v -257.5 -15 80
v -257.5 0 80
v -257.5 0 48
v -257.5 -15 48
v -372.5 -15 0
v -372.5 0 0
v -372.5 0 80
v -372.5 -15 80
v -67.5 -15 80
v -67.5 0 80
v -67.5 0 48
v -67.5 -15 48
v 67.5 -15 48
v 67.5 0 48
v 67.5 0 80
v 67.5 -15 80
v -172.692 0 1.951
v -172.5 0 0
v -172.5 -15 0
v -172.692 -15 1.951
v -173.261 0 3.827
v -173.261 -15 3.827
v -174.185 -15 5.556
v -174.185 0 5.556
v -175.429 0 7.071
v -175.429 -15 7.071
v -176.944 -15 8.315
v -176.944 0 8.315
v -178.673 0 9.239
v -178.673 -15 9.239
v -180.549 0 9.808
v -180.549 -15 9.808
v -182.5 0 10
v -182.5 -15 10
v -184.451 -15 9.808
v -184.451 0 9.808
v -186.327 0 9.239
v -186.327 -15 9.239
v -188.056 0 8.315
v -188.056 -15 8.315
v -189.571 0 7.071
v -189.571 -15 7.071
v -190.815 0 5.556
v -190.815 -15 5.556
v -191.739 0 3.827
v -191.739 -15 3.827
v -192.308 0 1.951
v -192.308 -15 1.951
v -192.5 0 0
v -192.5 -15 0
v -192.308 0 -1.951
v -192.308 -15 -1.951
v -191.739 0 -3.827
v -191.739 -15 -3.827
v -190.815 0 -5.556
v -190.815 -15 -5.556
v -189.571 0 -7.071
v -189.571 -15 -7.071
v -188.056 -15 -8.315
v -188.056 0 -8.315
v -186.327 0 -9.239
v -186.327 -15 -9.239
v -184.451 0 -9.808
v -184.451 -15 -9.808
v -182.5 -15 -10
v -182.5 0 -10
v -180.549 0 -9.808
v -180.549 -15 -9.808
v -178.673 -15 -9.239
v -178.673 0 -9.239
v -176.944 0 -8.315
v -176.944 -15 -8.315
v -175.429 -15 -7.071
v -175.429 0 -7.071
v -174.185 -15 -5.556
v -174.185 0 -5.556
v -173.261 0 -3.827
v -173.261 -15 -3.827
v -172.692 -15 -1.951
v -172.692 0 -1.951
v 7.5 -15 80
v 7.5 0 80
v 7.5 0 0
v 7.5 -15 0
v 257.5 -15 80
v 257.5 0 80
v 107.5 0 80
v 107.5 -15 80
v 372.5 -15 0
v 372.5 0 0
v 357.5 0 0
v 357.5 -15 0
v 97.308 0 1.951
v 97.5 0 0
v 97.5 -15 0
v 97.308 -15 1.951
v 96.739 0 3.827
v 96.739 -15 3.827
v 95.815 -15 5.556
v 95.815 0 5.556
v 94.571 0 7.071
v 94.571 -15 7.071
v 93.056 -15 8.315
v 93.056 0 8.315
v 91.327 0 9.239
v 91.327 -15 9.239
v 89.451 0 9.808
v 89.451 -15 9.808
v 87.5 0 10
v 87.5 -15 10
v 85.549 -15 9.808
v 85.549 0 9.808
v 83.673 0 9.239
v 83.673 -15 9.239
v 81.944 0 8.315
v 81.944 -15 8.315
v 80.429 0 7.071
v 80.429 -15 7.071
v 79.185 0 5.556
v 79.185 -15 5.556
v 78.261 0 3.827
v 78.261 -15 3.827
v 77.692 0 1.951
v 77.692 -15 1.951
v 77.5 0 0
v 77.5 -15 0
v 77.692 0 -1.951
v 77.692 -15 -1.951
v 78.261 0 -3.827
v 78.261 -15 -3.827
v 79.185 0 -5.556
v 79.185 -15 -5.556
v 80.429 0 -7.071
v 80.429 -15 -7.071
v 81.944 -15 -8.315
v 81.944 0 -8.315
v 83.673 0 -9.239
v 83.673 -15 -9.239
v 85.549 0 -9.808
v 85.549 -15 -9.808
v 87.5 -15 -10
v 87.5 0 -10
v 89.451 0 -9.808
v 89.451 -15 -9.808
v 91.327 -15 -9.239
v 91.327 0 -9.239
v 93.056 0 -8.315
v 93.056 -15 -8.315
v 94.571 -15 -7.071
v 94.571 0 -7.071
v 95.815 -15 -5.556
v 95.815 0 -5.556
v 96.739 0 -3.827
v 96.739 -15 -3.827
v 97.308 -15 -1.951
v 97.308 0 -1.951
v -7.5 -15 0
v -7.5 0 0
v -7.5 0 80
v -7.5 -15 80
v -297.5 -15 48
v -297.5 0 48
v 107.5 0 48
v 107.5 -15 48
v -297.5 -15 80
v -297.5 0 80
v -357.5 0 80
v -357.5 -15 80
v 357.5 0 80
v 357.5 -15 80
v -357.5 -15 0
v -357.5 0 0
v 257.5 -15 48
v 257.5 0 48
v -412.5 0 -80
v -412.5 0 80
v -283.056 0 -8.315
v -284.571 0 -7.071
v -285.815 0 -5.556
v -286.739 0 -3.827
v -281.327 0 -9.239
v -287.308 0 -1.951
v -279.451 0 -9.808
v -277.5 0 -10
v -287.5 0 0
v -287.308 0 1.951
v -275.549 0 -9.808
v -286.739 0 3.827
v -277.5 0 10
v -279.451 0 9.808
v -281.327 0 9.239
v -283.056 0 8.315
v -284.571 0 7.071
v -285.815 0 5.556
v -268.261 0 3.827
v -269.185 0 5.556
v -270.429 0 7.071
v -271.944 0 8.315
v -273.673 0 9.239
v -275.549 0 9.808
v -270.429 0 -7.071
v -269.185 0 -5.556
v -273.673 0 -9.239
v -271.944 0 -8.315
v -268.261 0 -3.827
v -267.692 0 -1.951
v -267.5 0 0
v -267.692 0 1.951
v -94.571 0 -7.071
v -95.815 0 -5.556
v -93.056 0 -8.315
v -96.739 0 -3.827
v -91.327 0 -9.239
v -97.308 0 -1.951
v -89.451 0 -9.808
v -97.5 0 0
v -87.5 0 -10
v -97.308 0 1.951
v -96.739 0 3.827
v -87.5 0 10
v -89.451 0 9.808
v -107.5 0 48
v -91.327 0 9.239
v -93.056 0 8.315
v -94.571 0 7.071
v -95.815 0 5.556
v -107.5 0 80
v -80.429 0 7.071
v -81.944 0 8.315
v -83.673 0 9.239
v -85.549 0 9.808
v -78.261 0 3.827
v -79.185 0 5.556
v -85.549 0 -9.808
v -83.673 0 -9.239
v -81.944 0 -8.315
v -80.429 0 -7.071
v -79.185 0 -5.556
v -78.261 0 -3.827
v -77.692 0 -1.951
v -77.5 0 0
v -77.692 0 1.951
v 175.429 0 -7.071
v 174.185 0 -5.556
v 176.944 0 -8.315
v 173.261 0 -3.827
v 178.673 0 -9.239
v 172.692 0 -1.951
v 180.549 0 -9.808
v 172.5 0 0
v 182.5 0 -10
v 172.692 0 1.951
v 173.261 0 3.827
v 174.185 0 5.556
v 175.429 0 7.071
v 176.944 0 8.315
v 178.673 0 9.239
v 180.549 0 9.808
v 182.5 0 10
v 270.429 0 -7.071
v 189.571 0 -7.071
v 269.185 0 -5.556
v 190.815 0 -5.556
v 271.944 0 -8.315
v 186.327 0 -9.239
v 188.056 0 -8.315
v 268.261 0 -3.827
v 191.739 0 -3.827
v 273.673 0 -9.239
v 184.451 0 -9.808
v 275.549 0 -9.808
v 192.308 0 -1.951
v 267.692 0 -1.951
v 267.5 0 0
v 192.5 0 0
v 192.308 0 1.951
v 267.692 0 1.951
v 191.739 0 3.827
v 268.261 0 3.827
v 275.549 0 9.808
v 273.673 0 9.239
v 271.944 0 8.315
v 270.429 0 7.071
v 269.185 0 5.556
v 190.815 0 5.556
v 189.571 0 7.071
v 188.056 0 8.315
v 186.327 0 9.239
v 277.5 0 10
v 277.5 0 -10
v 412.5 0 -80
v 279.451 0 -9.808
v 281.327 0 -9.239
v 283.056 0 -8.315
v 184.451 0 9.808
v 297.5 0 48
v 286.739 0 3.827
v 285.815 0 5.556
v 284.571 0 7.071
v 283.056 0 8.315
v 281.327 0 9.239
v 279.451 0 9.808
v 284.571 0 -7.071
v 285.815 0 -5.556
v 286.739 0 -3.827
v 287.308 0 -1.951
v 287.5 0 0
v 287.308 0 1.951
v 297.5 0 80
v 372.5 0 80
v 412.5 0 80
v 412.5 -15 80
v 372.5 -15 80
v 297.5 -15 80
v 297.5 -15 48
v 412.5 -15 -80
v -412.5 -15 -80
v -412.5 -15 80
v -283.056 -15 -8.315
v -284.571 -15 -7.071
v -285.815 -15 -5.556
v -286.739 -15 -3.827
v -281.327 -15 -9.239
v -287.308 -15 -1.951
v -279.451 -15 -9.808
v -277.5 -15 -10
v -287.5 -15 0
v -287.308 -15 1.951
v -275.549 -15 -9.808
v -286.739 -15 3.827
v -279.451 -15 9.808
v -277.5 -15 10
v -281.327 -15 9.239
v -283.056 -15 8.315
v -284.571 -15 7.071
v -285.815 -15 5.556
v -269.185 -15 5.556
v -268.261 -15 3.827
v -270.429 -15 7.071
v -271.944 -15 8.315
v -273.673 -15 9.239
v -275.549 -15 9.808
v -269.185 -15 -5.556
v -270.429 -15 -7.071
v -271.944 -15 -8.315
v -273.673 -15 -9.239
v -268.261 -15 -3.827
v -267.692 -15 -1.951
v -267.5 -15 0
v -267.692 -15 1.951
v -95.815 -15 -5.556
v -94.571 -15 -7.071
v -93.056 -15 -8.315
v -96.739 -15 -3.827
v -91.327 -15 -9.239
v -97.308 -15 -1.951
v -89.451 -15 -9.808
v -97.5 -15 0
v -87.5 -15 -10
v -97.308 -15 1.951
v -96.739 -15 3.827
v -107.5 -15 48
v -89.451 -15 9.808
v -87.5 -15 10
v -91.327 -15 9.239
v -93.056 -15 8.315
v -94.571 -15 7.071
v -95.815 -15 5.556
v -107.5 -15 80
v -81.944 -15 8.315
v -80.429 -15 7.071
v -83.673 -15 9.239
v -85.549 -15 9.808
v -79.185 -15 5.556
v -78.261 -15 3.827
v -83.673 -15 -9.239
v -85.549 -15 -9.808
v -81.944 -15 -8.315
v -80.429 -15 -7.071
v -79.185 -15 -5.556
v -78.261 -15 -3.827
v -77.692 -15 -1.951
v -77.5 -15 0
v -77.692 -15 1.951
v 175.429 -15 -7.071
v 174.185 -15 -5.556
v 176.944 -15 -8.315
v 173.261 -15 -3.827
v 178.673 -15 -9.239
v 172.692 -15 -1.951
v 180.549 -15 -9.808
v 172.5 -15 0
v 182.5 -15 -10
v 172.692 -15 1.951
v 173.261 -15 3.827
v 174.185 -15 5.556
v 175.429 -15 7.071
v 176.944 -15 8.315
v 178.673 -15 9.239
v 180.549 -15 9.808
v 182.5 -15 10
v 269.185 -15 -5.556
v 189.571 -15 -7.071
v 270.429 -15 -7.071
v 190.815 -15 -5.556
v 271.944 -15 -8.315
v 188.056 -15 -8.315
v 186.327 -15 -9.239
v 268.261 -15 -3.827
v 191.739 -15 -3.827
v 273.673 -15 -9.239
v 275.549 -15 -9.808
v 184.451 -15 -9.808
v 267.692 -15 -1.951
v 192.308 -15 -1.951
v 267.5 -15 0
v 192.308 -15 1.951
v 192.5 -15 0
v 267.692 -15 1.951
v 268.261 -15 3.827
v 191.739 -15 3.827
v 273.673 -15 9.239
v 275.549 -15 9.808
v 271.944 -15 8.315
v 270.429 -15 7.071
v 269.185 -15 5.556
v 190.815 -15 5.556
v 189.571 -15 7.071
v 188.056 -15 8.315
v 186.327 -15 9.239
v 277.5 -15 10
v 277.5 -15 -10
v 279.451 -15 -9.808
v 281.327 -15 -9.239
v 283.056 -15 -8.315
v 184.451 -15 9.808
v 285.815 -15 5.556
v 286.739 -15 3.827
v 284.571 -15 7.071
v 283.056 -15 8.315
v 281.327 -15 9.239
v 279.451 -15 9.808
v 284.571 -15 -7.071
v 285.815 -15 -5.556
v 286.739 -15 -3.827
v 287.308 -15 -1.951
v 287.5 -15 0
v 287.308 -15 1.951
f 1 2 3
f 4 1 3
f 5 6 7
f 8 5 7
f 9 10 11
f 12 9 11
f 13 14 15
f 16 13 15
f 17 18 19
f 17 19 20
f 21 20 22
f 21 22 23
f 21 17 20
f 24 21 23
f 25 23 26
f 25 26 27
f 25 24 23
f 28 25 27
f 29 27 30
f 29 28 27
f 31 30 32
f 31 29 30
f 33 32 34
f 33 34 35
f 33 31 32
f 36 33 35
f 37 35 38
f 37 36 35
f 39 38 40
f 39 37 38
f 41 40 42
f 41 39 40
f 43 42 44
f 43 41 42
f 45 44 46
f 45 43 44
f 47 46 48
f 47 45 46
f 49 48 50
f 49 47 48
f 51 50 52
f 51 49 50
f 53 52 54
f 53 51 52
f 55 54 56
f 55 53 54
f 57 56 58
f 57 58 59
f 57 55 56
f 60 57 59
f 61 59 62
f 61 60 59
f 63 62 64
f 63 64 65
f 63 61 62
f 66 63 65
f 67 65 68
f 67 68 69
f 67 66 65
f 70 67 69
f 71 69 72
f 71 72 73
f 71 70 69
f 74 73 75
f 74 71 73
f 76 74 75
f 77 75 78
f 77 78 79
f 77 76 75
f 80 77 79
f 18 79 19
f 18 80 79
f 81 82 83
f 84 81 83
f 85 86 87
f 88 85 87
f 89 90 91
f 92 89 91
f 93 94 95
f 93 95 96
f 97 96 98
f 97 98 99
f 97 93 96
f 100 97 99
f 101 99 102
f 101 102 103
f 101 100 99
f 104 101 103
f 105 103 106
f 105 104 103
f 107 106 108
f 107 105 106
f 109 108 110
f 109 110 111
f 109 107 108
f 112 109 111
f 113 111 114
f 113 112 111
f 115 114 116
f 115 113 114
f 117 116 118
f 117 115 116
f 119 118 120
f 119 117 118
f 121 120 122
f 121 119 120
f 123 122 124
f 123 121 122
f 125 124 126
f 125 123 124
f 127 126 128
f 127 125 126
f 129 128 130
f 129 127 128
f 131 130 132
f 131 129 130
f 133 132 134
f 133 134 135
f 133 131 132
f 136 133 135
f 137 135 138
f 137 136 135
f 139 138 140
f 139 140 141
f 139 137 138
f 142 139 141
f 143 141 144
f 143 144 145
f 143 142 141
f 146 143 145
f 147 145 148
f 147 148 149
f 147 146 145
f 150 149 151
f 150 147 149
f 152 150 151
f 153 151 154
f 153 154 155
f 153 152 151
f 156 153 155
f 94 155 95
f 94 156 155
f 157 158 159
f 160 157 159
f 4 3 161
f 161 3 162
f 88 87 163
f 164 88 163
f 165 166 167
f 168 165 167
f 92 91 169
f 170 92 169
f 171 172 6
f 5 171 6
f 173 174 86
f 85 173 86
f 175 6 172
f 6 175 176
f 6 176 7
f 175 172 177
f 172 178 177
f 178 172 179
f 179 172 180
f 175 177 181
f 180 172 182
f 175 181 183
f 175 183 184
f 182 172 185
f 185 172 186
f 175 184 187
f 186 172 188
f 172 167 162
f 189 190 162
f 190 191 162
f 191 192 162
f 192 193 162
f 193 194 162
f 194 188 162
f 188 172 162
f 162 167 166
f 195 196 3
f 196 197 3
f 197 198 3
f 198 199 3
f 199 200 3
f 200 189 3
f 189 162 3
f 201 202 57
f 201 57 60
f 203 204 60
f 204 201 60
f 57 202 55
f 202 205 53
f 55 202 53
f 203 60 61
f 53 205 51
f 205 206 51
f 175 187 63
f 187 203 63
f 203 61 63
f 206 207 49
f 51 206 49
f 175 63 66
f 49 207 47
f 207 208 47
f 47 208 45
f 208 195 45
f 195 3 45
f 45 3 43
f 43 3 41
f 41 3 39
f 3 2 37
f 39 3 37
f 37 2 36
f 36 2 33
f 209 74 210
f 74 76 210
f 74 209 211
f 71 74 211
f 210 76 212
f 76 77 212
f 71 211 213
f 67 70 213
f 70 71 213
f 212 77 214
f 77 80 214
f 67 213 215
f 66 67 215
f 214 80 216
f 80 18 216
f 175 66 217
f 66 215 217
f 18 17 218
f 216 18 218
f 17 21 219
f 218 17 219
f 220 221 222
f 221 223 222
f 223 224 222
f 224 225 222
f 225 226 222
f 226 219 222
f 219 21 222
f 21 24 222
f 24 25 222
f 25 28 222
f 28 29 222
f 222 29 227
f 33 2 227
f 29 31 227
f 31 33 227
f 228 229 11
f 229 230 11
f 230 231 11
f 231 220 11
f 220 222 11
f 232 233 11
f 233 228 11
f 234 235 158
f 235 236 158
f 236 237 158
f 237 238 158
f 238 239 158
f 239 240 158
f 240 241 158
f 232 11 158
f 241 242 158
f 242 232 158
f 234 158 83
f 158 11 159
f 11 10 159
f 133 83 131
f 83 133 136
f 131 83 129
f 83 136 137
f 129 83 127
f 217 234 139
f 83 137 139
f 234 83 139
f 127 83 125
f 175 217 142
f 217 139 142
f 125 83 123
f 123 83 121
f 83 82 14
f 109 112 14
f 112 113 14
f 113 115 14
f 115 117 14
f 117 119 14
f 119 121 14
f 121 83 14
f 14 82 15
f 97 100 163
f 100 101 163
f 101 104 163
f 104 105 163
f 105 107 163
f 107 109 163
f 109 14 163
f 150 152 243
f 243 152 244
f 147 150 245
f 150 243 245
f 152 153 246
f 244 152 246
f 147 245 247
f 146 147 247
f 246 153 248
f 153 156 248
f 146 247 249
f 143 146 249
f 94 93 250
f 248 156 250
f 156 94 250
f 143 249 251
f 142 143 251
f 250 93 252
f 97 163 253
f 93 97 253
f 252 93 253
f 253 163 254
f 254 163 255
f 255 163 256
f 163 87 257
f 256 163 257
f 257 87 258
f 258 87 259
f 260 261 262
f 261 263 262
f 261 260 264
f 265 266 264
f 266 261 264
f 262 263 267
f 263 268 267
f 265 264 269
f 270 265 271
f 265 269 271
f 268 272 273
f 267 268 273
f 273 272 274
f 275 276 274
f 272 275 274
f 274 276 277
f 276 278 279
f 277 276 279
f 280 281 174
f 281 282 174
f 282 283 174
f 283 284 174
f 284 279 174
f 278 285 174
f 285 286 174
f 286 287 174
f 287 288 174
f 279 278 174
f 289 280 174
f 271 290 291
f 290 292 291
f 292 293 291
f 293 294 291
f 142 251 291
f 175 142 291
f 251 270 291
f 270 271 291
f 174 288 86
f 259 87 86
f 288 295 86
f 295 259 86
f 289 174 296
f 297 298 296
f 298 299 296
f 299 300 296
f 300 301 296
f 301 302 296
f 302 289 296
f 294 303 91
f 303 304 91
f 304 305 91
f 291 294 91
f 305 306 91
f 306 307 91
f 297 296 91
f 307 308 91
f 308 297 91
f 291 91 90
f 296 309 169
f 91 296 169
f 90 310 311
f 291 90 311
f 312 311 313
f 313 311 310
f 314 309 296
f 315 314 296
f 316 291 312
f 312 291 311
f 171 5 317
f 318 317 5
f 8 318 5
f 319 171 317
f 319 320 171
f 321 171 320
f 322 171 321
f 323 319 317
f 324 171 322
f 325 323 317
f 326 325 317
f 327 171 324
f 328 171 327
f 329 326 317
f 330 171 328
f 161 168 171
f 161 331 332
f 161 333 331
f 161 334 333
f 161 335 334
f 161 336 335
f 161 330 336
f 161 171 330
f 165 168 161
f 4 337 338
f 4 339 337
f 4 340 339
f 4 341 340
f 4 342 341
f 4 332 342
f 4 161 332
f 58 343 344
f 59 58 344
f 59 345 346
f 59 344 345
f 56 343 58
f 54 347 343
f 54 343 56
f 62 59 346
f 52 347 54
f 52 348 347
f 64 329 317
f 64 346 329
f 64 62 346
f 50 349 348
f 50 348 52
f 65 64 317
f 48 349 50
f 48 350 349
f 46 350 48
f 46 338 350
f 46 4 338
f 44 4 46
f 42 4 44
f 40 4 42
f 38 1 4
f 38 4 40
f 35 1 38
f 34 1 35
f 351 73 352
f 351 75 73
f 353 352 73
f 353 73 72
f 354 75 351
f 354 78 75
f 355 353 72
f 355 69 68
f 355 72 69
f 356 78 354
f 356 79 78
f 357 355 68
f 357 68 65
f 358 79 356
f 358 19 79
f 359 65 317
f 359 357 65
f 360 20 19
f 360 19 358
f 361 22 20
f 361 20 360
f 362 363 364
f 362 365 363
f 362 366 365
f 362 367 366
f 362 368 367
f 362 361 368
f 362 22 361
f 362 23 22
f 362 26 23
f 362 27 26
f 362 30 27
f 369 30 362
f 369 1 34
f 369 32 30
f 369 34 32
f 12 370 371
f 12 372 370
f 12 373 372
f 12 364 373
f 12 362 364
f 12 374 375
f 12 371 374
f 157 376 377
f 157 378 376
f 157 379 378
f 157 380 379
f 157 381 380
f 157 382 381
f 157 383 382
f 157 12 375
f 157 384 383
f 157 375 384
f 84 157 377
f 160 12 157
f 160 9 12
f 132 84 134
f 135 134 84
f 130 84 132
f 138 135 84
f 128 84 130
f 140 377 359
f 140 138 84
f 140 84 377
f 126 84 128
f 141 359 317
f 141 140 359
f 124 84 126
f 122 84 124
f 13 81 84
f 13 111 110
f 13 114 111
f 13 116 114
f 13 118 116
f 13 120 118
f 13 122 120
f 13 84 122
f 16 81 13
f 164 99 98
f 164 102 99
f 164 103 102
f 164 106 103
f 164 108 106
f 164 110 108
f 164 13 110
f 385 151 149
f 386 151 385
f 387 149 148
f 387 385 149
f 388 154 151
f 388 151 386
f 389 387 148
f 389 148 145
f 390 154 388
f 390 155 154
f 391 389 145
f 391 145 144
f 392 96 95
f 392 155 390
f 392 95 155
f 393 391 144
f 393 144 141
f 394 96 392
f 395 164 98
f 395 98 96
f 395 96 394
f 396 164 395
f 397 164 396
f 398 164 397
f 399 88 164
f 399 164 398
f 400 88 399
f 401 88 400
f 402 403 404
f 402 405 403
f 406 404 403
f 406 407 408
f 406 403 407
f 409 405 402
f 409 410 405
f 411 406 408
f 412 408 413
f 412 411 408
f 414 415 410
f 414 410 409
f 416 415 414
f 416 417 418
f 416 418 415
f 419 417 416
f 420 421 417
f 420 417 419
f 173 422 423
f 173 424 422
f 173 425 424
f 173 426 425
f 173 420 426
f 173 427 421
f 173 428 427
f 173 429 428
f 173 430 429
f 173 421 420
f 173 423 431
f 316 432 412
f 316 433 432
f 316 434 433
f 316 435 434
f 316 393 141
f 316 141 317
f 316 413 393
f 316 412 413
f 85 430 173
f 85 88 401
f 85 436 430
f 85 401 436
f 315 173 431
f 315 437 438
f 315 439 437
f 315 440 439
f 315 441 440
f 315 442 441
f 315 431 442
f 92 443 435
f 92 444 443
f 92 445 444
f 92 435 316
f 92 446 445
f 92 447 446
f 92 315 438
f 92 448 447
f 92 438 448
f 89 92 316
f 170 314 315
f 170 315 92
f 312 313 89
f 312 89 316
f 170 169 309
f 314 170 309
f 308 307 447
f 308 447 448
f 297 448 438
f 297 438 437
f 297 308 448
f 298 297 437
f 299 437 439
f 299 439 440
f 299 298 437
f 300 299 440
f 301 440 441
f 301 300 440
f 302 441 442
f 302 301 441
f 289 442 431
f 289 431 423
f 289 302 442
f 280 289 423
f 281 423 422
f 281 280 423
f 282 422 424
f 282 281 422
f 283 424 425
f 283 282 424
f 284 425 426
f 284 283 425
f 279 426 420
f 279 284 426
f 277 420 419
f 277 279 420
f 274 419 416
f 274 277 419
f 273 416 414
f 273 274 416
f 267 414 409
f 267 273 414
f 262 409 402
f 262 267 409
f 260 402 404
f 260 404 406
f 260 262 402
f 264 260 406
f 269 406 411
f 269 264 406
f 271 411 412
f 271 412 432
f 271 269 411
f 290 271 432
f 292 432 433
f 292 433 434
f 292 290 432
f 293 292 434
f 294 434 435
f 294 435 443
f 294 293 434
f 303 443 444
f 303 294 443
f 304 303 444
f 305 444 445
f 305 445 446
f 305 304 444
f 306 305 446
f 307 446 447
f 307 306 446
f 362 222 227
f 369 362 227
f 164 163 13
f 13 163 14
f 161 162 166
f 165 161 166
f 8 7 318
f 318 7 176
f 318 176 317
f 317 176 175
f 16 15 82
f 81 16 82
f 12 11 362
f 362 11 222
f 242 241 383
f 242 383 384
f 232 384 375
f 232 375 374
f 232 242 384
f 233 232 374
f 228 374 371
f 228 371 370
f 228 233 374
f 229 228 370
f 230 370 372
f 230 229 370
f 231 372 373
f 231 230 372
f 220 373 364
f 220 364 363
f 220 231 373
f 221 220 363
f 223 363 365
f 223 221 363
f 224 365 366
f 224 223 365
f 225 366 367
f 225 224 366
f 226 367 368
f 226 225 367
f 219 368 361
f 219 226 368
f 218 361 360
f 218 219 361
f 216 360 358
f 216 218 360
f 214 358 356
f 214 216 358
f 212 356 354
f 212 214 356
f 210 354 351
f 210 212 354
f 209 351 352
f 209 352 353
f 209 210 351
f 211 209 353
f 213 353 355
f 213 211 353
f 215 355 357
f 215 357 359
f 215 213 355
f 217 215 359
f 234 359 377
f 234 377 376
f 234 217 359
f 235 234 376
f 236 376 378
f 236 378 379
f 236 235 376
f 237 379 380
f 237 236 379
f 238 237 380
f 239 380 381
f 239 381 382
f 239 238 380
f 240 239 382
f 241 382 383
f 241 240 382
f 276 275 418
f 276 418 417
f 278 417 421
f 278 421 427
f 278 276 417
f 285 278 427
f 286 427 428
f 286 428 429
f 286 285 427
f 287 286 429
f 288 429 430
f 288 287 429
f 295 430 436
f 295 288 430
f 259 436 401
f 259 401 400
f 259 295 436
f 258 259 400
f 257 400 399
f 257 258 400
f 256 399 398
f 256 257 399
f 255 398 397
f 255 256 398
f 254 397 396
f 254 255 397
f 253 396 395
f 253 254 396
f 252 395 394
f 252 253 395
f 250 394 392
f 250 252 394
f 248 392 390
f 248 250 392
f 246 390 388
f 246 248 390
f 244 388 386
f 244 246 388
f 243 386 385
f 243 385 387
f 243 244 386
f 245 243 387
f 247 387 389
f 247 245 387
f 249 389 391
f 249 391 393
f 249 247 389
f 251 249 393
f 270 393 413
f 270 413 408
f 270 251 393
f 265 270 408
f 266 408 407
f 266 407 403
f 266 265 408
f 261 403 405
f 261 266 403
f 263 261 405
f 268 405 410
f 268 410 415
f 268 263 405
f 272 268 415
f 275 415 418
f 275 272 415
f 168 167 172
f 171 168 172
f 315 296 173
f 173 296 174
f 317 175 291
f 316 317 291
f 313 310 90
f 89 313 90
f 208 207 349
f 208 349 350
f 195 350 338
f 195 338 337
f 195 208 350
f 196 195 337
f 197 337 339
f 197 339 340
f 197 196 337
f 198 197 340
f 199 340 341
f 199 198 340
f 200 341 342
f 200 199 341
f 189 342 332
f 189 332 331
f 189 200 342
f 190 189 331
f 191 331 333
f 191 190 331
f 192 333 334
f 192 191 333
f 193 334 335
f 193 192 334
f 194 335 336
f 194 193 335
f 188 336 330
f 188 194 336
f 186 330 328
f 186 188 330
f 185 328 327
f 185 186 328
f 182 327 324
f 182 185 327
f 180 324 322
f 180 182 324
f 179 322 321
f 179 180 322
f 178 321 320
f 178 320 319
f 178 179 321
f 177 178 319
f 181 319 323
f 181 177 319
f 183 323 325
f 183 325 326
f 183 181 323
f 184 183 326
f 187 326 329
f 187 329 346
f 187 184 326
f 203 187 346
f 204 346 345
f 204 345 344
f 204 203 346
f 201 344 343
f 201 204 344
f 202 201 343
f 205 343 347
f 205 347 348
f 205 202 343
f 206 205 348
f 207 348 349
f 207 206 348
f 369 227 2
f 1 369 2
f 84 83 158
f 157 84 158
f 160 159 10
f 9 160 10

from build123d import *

# Parameters (mm, degrees)
F0_R     = 10
F1_DEPTH = 15


with BuildPart() as f1:
    # F0 (on Front) → F1 (new body)
    with BuildSketch(Plane.XZ):
        Polygon((-372.5, 80), (-412.5, 80), (-412.5, -80), (-332.5, -80), (332.5, -80), (412.5, -80), (412.5, 80), (372.5, 80), (372.5, 0), (357.5, 0), (357.5, 80), (297.5, 80), (297.5, 48), (257.5, 48), (257.5, 80), (107.5, 80), (107.5, 48), (67.5, 48), (67.5, 80), (7.5, 80), (7.5, 0), (-7.5, 0), (-7.5, 80), (-67.5, 80), (-67.5, 48), (-107.5, 48), (-107.5, 80), (-257.5, 80), (-257.5, 48), (-297.5, 48), (-297.5, 80), (-357.5, 80), (-357.5, 0), (-372.5, 0), align=None)
        with Locations((-277.5, 0)):
            Circle(F0_R, mode=Mode.SUBTRACT)
        with Locations((-182.5, 0)):
            Circle(F0_R, mode=Mode.SUBTRACT)
        with Locations((-87.5, 0)):
            Circle(F0_R, mode=Mode.SUBTRACT)
        with Locations((87.5, 0)):
            Circle(F0_R, mode=Mode.SUBTRACT)
        with Locations((182.5, 0)):
            Circle(F0_R, mode=Mode.SUBTRACT)
        with Locations((277.5, 0)):
            Circle(F0_R, mode=Mode.SUBTRACT)
    extrude(amount=F1_DEPTH)


solid = f1.part
